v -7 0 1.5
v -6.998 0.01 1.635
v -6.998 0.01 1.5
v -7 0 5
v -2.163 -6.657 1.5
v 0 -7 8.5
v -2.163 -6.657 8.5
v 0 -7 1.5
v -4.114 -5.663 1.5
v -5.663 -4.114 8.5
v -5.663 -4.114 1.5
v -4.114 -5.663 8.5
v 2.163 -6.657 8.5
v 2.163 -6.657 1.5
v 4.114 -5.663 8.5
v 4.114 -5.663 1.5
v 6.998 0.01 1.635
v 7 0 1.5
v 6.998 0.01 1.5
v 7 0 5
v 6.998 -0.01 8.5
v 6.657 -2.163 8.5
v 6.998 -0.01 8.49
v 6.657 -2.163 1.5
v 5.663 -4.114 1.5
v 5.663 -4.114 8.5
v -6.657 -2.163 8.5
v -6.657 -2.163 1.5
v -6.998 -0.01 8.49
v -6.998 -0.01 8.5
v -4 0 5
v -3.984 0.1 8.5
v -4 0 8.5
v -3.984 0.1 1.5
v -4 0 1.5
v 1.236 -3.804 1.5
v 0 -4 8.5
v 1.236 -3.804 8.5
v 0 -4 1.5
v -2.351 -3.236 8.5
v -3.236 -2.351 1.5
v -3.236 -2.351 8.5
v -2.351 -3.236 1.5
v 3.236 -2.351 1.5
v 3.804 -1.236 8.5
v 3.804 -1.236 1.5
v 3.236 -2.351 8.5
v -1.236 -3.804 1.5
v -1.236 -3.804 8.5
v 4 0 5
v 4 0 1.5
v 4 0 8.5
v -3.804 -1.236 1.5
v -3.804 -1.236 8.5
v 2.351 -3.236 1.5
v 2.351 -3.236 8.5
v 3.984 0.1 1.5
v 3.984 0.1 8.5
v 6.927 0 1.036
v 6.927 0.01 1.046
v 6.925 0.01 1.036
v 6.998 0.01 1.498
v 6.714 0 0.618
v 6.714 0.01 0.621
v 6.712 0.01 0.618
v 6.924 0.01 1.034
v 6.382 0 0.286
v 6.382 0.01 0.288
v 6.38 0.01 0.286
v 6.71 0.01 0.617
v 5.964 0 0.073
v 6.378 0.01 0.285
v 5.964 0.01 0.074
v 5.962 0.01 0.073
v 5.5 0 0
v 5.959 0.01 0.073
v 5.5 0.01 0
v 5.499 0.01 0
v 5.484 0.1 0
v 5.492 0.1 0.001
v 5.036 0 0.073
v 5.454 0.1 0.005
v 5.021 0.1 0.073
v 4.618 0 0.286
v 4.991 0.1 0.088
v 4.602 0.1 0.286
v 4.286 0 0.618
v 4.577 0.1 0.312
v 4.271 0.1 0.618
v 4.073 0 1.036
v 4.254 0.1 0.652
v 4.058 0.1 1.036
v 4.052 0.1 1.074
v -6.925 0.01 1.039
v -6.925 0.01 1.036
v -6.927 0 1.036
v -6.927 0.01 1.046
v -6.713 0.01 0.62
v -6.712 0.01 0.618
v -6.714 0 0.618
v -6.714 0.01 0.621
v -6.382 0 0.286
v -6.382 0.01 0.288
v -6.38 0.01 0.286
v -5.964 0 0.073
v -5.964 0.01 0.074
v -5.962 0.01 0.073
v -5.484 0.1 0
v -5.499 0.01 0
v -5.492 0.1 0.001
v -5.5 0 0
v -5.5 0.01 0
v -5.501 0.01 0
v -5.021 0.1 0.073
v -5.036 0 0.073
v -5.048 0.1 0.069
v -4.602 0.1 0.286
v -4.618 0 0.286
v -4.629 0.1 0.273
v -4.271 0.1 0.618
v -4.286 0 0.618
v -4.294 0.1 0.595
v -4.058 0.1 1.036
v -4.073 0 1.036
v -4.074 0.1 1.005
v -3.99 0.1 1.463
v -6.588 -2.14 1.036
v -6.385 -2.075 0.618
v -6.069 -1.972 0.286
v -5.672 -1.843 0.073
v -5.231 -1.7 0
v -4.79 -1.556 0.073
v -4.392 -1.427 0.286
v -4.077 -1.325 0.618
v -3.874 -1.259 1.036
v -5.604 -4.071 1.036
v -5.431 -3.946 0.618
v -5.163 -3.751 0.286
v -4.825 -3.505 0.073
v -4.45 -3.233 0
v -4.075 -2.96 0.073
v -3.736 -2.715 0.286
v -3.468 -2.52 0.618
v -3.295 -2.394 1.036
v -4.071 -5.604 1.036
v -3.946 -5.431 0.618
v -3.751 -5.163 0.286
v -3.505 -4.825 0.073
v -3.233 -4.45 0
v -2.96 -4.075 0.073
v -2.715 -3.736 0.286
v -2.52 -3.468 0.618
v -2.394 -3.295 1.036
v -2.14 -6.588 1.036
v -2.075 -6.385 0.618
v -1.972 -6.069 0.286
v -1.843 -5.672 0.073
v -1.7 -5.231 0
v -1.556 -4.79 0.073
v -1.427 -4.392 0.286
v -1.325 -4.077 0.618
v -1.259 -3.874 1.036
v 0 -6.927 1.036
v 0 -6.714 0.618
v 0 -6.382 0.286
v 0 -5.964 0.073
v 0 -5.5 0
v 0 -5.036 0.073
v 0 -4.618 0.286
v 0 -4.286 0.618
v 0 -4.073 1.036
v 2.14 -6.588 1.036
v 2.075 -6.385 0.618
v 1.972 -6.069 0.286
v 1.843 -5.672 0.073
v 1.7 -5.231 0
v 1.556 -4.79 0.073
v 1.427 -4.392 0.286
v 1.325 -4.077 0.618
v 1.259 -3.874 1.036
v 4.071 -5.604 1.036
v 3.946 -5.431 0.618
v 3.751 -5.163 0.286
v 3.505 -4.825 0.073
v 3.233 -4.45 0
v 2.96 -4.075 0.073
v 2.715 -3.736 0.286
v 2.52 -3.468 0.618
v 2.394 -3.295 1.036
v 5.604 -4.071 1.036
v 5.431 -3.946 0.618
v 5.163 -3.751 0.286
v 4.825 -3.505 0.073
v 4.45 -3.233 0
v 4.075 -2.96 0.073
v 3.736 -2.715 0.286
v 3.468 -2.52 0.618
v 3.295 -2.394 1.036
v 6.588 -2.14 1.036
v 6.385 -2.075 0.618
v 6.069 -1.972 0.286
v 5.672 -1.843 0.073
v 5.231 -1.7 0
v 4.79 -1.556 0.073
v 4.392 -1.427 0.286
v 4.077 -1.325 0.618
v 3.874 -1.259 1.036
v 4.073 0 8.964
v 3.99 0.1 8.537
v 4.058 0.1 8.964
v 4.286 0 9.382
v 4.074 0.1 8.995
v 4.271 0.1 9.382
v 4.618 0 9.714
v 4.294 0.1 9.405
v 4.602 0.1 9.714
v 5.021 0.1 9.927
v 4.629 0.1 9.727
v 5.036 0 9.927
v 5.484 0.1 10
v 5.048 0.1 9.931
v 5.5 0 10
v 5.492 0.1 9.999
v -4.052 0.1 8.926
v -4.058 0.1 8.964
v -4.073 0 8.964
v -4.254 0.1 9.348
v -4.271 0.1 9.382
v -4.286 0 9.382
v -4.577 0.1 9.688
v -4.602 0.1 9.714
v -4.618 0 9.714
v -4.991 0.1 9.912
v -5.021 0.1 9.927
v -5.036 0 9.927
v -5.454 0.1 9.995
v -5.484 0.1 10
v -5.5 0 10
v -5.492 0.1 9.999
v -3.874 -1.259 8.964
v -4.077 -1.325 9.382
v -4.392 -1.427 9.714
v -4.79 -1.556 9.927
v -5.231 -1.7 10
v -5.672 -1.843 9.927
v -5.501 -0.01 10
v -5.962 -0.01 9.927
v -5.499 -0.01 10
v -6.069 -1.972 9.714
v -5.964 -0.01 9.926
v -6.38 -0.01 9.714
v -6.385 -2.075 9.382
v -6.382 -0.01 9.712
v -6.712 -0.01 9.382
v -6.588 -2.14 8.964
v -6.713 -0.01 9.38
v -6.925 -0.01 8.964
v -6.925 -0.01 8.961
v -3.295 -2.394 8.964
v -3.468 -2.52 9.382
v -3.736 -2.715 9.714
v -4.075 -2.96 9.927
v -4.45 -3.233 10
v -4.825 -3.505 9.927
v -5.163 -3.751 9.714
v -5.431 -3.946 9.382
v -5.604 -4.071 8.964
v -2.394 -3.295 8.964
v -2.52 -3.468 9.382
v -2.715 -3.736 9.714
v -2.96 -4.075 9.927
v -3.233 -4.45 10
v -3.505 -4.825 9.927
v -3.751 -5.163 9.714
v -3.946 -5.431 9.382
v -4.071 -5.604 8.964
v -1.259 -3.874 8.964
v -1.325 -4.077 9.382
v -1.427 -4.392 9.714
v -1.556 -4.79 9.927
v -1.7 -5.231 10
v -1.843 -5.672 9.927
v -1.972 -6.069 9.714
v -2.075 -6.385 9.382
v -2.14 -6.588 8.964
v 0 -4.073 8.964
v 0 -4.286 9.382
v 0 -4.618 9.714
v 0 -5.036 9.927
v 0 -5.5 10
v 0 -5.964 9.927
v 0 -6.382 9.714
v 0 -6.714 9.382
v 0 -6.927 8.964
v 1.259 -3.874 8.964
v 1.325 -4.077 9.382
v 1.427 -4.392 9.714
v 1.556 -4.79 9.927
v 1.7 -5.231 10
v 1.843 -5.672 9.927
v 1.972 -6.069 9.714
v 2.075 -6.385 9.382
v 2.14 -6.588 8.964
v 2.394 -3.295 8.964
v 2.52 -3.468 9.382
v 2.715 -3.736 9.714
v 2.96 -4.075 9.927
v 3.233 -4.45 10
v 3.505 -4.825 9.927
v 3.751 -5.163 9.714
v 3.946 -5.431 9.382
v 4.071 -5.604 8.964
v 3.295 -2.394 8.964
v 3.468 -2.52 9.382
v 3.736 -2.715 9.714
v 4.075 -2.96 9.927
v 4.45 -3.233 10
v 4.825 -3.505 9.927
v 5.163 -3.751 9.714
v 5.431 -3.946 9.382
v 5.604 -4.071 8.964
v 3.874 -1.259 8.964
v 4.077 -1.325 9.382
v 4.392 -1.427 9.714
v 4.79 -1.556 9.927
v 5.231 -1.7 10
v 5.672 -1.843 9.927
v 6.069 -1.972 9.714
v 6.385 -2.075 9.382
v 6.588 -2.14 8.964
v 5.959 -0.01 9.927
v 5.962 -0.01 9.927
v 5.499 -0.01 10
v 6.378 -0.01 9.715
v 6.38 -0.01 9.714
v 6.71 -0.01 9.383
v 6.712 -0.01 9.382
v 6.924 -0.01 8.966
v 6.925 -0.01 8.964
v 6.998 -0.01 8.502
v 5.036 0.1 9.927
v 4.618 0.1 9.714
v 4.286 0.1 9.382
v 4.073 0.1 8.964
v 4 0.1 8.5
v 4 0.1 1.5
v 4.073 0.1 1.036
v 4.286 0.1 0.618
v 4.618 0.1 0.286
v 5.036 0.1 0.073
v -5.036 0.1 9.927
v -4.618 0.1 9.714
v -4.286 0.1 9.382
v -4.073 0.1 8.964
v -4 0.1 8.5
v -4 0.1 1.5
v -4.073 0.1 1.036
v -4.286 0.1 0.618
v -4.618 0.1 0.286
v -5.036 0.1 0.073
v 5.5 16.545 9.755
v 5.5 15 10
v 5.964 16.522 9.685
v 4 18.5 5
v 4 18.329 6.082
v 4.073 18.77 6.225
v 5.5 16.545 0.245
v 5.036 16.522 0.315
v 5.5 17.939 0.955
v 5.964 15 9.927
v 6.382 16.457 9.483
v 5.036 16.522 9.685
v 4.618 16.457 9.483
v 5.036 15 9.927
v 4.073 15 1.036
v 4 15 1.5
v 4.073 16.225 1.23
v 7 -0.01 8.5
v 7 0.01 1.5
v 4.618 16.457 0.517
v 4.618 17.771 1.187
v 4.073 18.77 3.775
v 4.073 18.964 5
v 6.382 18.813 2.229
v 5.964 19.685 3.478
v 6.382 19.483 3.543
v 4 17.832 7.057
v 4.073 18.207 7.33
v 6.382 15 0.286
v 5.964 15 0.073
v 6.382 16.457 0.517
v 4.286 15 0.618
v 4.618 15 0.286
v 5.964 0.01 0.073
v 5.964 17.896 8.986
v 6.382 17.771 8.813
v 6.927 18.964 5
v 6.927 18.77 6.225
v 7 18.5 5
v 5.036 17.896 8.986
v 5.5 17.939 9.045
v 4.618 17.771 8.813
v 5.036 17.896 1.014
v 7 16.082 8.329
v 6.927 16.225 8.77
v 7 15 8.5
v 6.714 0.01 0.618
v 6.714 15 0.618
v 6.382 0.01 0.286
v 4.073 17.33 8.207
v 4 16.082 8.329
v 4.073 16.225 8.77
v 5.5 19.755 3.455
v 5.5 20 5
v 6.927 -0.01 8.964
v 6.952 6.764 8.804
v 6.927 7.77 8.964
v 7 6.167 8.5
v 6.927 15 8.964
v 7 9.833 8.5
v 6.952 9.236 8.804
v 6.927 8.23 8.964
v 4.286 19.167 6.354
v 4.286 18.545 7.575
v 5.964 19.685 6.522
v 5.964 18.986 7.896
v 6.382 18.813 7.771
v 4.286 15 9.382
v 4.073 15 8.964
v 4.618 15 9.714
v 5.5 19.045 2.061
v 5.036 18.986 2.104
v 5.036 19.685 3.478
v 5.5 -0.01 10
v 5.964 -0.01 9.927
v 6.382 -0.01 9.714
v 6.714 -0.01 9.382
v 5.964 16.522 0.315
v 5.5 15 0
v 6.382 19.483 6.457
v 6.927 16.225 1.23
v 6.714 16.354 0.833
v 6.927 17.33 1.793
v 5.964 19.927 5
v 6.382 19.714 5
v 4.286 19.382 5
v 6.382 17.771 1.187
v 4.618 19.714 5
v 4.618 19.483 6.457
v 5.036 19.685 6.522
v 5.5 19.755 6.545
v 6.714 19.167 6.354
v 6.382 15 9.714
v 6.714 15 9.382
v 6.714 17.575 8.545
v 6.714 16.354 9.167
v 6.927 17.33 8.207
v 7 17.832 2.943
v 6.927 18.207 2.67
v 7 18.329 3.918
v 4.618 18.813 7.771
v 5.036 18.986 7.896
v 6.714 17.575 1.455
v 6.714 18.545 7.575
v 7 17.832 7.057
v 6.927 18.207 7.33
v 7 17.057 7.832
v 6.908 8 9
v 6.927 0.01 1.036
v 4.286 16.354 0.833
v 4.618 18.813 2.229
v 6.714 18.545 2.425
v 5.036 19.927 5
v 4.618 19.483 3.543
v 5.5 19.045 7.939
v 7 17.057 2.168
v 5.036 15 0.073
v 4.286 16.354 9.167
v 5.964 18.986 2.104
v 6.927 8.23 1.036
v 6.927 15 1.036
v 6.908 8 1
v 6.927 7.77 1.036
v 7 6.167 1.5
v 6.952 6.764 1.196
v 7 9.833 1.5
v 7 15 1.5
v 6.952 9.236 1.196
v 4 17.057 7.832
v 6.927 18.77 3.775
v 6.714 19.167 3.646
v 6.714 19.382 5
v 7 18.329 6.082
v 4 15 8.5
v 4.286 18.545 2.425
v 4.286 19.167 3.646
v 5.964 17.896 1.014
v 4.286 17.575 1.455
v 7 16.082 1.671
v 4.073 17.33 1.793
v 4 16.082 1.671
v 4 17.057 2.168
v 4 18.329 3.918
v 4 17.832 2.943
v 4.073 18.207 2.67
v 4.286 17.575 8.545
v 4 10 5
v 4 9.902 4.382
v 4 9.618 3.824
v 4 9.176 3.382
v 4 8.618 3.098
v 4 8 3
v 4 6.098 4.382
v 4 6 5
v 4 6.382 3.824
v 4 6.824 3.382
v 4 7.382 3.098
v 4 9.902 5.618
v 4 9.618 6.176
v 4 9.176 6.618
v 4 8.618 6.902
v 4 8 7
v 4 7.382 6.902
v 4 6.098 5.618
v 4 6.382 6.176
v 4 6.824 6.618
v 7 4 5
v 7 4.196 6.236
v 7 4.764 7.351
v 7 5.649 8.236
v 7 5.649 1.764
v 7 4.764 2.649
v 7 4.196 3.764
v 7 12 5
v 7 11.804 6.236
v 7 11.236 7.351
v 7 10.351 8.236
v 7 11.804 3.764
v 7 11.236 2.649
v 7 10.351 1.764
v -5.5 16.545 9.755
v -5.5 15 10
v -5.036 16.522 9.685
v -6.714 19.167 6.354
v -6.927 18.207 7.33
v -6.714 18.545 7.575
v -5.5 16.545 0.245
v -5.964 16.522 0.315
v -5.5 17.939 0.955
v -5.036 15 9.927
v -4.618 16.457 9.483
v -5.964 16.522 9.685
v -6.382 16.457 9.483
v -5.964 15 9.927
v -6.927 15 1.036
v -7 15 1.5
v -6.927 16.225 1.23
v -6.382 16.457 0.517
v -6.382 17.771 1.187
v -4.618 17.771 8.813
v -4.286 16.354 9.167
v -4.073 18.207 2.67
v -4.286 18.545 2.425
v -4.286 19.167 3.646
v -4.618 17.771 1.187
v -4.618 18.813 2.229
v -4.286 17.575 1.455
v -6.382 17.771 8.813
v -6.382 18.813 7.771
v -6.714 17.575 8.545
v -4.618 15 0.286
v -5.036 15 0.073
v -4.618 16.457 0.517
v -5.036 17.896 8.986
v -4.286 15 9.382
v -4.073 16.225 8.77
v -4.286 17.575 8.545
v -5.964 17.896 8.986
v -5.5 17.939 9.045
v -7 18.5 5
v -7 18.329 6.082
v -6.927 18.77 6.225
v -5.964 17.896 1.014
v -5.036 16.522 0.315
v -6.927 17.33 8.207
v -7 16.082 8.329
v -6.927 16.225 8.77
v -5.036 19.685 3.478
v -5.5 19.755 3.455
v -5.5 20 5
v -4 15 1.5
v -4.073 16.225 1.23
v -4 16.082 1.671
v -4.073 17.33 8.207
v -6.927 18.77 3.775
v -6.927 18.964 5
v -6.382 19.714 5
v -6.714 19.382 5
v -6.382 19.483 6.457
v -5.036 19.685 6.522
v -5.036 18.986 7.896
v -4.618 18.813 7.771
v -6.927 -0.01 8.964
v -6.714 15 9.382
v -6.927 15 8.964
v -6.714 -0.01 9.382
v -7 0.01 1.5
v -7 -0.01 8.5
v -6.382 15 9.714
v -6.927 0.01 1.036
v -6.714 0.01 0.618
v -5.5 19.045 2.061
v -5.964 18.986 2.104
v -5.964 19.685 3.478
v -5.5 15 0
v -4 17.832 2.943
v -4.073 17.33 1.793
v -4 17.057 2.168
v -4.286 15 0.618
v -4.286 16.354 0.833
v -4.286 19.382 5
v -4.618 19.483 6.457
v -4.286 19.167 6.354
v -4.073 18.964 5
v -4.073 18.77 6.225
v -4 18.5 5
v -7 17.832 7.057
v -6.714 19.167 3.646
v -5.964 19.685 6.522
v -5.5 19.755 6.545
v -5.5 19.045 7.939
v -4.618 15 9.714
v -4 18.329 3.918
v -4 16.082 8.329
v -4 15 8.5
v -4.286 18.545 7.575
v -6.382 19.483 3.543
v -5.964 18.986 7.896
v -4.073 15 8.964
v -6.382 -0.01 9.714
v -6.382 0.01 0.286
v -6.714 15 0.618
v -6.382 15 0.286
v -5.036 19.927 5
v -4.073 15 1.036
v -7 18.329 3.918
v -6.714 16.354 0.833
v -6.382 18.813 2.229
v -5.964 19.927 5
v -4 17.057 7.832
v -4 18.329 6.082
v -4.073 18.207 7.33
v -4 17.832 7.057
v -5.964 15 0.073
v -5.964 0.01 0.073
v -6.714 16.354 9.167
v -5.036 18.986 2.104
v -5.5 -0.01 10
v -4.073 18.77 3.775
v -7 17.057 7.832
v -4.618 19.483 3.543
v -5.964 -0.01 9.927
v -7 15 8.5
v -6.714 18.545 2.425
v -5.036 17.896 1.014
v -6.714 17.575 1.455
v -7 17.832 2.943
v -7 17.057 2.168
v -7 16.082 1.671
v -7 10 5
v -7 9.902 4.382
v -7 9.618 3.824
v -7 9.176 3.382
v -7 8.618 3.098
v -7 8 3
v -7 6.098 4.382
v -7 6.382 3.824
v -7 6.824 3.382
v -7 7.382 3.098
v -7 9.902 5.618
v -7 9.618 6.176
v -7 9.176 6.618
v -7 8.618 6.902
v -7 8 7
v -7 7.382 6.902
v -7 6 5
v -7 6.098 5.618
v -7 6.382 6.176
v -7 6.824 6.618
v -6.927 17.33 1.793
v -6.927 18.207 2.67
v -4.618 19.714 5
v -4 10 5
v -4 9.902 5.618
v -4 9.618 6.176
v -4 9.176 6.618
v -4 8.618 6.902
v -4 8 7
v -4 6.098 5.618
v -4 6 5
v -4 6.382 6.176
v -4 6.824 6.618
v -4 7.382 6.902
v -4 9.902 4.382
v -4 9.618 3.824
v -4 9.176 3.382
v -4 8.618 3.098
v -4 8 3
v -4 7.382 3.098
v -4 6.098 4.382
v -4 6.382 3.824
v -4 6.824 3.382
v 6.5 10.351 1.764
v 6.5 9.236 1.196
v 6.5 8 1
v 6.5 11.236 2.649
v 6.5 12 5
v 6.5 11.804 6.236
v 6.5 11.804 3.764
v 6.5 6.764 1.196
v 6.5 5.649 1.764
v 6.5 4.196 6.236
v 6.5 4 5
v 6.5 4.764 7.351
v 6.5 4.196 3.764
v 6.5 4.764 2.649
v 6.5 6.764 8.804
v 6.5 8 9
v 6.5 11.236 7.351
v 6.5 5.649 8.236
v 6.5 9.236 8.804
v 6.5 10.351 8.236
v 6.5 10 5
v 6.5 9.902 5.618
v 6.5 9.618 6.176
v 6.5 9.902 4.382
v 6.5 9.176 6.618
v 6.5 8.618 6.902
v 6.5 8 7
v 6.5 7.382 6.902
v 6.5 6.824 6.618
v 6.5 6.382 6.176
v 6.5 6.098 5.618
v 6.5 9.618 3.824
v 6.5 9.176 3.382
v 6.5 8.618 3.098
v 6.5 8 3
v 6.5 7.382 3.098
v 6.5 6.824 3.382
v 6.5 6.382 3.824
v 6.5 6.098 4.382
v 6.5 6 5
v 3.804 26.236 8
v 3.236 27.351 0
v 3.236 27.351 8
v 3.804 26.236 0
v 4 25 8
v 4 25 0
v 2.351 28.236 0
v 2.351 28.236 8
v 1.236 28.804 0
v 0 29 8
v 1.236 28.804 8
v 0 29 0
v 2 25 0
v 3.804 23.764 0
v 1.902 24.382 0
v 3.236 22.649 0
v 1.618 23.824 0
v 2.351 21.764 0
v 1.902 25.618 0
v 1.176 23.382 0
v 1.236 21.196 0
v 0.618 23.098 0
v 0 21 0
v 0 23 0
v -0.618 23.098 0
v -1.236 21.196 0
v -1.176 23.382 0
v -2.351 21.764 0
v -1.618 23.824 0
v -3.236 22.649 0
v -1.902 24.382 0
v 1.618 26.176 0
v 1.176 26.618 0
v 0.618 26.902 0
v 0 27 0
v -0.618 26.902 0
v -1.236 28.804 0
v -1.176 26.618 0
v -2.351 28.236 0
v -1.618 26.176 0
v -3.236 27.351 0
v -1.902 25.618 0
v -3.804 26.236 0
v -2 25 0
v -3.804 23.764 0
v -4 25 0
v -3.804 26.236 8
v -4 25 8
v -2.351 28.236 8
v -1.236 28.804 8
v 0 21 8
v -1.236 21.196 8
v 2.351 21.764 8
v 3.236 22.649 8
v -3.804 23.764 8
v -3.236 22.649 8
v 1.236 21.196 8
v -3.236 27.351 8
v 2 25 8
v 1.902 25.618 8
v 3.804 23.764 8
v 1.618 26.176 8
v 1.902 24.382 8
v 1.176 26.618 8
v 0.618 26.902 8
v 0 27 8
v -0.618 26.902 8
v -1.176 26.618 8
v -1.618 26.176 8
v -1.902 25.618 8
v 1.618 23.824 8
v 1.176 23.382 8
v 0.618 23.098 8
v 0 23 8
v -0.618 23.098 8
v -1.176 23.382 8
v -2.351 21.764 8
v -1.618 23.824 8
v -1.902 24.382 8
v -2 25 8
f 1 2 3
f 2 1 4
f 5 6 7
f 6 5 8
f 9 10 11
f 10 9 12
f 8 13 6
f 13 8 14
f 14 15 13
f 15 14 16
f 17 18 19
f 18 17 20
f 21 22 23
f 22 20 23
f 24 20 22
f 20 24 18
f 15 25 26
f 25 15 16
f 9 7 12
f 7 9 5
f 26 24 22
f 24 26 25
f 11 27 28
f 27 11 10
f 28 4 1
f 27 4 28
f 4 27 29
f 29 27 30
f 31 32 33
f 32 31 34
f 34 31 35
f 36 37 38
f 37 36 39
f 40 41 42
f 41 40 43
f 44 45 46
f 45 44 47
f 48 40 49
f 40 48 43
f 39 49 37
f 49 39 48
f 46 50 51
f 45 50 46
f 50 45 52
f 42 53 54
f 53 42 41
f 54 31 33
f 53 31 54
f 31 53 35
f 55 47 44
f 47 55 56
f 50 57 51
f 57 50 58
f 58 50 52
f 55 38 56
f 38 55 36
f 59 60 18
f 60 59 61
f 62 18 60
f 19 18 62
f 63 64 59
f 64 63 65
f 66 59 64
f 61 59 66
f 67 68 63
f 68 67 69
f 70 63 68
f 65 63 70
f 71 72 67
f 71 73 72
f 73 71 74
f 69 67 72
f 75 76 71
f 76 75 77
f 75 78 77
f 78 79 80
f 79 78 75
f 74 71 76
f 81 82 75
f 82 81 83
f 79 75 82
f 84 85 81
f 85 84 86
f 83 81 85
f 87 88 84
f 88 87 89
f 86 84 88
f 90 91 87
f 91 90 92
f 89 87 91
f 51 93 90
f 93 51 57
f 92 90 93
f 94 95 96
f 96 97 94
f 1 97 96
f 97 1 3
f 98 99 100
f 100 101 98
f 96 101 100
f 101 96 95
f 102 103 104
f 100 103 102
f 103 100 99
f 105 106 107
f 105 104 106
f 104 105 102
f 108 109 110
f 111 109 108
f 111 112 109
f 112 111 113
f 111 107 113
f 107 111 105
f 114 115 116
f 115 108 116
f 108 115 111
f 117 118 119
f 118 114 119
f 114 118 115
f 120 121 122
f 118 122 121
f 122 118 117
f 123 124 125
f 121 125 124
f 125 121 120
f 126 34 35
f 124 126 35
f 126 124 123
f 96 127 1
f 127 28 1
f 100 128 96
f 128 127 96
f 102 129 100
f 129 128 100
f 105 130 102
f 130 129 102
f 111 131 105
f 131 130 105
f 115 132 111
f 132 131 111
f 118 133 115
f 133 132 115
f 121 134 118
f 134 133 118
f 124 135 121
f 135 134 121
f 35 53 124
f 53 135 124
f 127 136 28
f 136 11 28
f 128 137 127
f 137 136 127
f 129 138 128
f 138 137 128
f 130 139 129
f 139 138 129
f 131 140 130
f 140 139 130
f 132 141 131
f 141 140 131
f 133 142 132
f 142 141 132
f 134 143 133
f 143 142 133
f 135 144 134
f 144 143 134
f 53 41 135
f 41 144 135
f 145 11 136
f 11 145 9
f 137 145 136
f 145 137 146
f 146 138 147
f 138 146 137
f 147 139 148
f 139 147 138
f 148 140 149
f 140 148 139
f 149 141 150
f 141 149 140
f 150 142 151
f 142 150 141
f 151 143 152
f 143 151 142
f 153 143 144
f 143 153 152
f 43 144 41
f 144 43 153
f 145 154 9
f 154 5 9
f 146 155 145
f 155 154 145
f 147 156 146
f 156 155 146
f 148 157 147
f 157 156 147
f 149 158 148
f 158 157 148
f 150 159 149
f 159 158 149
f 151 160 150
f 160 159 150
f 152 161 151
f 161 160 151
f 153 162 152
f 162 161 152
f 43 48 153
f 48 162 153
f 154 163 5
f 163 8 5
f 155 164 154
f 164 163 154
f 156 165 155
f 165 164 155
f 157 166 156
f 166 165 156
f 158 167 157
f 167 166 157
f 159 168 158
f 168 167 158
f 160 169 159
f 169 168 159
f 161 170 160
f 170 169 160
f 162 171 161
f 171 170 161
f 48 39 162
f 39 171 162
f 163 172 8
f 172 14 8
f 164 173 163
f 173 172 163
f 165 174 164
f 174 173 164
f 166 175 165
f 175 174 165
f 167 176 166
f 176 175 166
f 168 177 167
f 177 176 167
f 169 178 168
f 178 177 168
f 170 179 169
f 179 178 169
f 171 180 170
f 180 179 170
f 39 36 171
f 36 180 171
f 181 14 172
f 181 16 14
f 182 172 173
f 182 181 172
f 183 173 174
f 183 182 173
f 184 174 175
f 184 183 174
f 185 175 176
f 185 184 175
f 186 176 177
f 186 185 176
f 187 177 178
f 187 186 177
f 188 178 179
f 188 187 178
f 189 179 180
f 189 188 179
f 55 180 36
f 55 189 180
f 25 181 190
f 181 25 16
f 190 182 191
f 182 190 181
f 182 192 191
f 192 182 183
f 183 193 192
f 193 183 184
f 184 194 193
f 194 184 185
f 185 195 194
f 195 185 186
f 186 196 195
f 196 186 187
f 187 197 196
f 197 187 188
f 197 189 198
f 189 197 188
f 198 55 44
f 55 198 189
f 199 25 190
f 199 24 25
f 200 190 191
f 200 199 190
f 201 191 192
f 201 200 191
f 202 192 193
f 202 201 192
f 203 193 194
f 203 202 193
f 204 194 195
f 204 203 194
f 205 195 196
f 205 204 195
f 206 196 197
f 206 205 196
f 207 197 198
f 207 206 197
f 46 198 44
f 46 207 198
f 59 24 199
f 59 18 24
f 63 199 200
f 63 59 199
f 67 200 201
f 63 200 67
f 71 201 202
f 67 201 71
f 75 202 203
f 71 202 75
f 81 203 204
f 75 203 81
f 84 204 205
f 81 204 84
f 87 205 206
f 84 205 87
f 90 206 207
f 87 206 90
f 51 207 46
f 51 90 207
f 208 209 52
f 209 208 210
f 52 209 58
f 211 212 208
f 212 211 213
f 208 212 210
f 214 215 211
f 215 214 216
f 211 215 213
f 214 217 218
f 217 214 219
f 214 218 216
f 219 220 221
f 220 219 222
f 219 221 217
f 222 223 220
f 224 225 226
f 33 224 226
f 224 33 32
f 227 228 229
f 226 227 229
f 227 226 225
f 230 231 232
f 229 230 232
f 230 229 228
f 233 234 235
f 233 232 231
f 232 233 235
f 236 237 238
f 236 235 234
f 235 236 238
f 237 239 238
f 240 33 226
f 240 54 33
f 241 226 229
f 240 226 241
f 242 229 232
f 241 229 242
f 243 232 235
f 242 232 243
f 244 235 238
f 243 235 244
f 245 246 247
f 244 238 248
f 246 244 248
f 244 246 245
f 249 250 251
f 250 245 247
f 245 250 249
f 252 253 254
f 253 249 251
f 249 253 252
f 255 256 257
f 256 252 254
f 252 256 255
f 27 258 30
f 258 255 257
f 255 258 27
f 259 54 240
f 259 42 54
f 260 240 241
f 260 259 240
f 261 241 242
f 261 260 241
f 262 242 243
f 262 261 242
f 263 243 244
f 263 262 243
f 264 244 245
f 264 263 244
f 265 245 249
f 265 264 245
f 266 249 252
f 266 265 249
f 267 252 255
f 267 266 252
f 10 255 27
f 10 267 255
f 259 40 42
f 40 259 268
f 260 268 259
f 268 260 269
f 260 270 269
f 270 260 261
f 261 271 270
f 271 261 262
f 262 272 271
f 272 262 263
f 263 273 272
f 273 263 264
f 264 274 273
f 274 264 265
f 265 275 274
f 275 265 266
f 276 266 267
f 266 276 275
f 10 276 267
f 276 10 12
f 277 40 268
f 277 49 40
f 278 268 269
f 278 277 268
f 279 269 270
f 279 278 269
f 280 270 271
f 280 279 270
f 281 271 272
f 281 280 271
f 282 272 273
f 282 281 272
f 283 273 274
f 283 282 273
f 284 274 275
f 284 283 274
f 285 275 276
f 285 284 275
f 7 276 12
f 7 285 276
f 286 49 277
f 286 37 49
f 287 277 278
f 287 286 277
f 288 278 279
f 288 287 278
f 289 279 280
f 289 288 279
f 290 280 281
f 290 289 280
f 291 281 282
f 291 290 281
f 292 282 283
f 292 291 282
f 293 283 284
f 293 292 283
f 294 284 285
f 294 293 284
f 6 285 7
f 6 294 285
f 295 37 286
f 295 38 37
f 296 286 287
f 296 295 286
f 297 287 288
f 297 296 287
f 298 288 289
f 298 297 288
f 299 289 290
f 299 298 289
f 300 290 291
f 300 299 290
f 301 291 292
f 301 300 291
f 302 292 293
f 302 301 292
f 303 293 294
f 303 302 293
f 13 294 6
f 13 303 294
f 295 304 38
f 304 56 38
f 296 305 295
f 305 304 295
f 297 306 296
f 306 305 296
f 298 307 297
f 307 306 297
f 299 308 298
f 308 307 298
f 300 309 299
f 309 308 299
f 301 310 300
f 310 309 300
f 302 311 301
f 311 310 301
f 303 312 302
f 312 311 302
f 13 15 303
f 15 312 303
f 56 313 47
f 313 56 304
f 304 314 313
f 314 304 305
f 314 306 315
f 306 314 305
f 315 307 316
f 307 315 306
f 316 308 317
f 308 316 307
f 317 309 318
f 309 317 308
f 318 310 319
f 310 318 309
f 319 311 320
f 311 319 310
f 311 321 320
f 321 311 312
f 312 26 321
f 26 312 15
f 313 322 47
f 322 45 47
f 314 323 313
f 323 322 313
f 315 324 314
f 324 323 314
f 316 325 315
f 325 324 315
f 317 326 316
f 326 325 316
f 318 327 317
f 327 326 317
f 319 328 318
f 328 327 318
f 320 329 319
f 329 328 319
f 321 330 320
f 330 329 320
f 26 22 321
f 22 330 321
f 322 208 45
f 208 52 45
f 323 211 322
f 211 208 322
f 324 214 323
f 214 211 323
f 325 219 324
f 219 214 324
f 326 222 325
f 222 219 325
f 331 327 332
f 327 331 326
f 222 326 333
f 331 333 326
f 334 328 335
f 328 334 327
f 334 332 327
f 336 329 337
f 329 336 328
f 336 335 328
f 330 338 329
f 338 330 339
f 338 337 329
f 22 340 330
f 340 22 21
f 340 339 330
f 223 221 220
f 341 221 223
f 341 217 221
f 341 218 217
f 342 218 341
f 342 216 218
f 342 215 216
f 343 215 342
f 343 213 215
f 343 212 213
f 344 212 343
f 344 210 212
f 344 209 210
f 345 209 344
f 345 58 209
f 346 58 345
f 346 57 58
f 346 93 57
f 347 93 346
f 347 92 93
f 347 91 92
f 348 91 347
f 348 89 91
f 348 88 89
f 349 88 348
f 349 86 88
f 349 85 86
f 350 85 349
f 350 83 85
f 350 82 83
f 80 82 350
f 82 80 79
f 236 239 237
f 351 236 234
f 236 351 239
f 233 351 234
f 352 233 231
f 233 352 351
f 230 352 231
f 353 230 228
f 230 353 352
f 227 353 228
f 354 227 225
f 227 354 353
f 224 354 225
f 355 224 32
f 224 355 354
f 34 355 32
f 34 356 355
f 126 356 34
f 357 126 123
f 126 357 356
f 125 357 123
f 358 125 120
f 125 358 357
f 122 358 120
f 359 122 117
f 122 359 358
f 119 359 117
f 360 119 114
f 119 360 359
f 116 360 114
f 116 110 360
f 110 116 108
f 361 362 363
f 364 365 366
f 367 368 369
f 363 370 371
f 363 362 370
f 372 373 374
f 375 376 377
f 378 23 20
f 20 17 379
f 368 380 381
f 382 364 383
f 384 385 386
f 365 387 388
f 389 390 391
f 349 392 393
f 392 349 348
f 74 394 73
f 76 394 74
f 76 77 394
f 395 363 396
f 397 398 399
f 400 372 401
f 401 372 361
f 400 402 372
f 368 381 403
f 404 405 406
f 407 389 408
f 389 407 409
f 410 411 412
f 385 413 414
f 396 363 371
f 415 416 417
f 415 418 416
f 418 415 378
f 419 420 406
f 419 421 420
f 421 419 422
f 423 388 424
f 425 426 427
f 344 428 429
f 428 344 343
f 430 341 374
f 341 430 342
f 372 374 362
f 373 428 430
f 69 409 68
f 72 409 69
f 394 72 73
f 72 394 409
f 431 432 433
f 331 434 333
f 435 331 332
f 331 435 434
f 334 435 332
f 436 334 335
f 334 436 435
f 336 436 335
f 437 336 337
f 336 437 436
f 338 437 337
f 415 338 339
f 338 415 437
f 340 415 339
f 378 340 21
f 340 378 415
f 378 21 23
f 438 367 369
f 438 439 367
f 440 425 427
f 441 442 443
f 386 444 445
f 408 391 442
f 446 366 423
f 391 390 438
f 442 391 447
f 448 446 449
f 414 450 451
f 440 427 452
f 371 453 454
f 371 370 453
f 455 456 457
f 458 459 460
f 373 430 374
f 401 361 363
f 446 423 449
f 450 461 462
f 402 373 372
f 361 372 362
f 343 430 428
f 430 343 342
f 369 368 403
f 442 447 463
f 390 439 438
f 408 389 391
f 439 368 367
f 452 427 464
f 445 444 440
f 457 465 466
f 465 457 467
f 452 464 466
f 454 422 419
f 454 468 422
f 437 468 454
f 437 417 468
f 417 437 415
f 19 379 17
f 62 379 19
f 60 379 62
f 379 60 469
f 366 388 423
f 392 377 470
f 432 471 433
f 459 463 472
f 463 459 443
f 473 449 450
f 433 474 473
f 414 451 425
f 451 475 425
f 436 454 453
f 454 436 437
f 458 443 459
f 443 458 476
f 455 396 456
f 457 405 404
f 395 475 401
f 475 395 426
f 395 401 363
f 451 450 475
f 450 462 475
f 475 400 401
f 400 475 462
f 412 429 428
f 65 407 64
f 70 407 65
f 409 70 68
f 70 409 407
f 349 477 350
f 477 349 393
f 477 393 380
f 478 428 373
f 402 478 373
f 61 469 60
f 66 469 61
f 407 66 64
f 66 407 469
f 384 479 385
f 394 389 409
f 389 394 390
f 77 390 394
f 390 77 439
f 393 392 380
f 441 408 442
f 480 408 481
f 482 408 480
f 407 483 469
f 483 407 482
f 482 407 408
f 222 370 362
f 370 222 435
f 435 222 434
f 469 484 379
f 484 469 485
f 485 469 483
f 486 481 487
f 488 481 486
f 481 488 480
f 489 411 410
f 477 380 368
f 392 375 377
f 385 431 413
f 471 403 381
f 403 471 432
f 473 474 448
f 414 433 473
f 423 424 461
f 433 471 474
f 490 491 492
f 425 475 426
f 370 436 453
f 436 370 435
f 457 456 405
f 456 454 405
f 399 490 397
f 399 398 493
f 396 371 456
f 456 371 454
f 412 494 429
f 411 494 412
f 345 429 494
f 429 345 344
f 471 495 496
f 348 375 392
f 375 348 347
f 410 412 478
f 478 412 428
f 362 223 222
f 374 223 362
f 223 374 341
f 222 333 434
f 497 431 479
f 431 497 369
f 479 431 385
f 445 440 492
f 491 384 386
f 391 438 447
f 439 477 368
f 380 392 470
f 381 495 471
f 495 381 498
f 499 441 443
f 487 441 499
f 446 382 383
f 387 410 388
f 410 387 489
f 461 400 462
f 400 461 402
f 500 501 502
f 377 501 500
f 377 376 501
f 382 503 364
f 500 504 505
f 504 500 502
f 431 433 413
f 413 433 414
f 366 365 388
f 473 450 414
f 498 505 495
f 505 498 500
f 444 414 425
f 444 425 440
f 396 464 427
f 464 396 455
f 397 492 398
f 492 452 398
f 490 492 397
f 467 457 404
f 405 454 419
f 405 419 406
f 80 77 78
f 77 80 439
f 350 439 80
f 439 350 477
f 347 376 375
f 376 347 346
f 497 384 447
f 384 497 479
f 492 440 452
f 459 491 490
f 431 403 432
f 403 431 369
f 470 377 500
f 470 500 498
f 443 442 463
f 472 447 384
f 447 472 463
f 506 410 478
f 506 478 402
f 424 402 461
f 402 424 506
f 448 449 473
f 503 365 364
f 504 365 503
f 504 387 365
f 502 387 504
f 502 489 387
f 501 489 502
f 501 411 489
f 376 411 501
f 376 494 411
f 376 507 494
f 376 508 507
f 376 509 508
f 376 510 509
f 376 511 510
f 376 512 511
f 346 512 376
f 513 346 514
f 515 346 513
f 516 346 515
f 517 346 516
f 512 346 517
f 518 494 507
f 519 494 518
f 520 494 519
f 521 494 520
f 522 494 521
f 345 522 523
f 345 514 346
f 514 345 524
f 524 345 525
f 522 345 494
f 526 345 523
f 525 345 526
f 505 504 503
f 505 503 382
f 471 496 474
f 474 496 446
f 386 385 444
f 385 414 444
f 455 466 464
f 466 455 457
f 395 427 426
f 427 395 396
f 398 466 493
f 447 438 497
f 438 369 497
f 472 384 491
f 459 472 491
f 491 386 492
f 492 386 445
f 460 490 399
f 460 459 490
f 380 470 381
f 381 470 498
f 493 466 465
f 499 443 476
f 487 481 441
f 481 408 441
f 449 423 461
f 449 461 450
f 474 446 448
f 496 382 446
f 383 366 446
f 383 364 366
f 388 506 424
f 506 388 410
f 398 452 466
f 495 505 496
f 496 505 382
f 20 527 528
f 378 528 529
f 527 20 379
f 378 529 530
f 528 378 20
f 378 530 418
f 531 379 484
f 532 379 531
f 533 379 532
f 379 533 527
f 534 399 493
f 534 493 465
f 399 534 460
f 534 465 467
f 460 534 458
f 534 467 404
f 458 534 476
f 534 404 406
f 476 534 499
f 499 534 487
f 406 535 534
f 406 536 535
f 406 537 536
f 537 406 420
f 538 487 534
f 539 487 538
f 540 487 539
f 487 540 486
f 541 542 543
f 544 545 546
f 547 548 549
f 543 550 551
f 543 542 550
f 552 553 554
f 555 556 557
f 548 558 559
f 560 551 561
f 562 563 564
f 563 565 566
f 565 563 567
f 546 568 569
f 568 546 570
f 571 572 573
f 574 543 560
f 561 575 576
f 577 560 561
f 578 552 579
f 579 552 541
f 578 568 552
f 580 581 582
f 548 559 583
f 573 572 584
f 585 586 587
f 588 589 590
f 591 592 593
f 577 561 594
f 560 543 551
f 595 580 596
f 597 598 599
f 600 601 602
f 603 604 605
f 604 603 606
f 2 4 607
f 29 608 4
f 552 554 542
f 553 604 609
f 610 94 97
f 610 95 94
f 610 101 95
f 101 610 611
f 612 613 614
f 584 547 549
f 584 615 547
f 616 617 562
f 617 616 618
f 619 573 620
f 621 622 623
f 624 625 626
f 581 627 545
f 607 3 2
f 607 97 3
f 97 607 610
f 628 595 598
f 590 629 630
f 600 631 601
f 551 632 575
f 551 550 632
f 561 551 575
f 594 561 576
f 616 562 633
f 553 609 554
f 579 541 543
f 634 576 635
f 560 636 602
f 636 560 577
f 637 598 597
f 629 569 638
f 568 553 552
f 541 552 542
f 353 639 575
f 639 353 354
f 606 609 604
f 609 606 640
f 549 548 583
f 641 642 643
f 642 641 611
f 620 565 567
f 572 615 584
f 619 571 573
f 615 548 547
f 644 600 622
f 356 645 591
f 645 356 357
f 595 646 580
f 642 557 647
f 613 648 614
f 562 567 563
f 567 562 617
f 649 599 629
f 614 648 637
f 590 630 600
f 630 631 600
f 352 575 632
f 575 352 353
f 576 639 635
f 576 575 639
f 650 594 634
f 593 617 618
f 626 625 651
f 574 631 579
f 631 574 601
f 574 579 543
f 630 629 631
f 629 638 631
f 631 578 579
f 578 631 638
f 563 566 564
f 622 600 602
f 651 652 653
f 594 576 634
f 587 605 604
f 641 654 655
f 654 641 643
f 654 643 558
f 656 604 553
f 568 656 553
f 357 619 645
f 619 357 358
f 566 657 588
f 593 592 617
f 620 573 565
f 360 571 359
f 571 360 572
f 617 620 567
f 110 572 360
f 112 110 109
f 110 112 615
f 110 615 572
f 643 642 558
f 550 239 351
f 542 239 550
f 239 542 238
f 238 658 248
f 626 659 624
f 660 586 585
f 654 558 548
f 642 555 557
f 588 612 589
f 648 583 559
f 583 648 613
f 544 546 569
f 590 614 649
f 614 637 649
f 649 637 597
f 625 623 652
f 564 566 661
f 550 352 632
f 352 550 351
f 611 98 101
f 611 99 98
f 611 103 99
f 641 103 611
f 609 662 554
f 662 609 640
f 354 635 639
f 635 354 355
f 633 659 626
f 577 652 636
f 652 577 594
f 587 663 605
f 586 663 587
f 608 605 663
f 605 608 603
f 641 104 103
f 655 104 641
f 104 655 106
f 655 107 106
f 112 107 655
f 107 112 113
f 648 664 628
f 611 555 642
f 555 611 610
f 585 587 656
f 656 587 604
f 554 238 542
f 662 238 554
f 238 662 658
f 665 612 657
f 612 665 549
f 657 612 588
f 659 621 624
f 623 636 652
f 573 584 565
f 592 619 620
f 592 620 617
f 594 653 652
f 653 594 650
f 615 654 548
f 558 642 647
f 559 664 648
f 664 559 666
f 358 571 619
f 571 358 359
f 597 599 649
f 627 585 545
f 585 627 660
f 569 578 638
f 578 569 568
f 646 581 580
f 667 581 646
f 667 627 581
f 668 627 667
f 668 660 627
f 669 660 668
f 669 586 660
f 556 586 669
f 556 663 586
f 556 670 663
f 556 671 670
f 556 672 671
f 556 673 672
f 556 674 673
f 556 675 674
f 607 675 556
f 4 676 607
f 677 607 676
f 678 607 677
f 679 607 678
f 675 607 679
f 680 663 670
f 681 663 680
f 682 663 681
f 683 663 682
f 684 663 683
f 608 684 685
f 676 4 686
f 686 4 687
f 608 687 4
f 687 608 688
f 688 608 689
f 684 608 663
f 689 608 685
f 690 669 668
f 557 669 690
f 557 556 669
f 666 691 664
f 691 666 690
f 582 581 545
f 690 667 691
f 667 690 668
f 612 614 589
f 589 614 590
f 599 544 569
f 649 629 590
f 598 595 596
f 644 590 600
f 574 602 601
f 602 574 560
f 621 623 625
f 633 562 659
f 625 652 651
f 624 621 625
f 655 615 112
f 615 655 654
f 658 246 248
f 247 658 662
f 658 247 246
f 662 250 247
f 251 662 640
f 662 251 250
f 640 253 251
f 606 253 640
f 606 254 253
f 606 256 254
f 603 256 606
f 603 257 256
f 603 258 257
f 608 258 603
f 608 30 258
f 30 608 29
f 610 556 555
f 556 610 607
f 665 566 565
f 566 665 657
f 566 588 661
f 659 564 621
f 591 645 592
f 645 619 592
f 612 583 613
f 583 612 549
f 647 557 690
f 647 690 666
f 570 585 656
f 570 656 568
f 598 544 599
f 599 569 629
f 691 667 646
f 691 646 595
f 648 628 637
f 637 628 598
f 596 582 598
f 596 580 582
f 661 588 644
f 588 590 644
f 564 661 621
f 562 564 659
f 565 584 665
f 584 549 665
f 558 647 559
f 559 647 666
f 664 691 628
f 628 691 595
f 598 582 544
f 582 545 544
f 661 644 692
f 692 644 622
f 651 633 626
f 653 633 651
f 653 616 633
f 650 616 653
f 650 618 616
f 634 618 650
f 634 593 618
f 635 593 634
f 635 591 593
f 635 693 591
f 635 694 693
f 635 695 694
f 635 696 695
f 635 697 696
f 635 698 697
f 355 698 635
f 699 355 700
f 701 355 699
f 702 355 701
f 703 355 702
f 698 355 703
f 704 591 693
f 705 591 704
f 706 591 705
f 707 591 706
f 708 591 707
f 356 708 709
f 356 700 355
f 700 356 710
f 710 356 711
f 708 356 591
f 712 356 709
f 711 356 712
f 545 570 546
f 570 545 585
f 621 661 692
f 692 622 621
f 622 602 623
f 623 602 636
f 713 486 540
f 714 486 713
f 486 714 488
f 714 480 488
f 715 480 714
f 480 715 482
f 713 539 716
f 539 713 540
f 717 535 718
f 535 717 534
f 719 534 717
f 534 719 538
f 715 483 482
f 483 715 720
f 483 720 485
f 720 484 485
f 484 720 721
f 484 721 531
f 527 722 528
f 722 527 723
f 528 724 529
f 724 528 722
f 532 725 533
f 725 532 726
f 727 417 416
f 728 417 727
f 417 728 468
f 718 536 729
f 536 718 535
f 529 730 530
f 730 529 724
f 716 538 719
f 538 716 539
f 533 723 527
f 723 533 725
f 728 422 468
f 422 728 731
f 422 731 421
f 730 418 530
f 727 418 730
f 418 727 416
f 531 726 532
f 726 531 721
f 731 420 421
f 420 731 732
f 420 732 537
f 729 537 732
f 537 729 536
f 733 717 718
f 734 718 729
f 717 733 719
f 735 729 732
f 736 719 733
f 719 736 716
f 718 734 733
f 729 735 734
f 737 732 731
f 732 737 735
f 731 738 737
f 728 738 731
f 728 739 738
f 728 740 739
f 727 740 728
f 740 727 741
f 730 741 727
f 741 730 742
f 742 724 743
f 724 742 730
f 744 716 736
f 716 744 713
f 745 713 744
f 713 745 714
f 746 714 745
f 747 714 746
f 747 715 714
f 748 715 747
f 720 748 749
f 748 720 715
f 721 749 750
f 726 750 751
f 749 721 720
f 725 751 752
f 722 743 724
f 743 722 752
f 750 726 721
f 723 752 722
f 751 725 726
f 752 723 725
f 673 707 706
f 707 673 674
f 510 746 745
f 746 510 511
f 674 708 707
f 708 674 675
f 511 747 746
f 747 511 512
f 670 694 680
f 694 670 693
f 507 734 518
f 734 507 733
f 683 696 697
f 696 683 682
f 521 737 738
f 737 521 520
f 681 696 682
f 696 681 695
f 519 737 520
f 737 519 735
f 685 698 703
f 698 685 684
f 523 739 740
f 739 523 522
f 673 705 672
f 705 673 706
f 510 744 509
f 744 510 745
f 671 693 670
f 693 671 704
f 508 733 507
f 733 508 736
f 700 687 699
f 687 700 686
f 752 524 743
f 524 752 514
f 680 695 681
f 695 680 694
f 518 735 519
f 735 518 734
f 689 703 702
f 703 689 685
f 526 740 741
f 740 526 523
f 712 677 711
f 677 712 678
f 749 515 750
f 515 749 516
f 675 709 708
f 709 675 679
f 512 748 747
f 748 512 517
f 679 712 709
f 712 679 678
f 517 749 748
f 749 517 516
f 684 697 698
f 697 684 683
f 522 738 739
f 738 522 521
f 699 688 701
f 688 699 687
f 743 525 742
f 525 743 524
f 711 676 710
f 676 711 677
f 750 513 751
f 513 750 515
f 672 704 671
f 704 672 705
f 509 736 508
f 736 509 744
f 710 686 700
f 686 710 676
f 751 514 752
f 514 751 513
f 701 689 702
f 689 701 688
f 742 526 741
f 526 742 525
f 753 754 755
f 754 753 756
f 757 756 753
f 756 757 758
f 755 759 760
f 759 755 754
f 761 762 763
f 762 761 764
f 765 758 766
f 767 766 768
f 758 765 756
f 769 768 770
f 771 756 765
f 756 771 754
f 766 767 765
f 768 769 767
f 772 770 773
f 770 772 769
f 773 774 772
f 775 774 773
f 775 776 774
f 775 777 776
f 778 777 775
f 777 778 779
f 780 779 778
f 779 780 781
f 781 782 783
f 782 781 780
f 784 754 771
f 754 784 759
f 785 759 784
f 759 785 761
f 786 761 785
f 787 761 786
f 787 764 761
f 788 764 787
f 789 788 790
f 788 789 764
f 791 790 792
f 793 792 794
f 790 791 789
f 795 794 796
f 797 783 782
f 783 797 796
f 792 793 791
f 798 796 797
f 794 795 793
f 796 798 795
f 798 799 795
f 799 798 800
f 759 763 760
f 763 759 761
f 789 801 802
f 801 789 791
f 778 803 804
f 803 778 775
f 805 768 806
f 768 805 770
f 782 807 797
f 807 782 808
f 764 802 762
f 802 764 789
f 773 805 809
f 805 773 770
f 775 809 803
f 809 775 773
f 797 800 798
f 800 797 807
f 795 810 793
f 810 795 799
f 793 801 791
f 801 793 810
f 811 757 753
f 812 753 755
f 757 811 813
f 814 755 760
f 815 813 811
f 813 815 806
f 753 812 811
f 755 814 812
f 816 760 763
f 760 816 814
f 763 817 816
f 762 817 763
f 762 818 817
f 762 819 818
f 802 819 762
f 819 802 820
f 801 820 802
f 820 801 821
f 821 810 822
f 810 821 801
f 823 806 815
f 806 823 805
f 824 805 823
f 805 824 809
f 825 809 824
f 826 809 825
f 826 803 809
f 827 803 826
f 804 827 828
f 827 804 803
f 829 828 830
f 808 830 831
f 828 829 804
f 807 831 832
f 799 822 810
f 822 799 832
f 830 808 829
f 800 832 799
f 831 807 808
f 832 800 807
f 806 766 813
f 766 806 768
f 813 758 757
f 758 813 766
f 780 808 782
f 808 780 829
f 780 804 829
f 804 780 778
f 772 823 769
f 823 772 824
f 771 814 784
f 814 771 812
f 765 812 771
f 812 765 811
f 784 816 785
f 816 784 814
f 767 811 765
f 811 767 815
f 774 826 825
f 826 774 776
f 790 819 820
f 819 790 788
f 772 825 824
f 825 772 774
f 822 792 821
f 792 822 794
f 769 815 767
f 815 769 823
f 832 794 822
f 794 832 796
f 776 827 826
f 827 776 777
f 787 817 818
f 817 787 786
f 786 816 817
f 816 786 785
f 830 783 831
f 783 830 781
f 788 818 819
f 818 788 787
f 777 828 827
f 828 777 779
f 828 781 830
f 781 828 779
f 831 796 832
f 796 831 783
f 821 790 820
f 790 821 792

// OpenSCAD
$fn=20;

module clip() {
    difference(){
        union(){
            difference(){
                hull(){
                    rotate([0,90,0]) cylinder(r=5, h=10, center = true);
                    translate([0,15,0]) cylinder(r=5, h=10, center = true);
                }
                rotate([0,90,0]) hull(){
                     cylinder(r=3, h=12, center = true);
                    translate([0,20,0]) cube([6,6,12], center = true);
                }
            }
            translate([0,8,0]) cylinder(r=5, h=10,center=true);
        }

        //trou de vis
        translate([0,8,4.5]) cylinder(r=4, h=10);
        translate([0,8,0]) cylinder(r=1.5, h=12,center=true);
    }
}
module torus(torus_radius,body_radius){
rotate_extrude(angle = 360, convexity = 2) translate([torus_radius,0,0]) circle(r=body_radius);
}
module ring(height,hole_radius,thickness){
    half_thickness = (thickness/2);
    difference(){
        cylinder(
            r=(hole_radius+thickness),
            h=height-thickness,center = true);
        cylinder(r=hole_radius,h=height,center = true);
    }
    translate([0,0,(height/2)-half_thickness]) torus(hole_radius+half_thickness,half_thickness);
    translate([0,0,-((height/2)-half_thickness)]) torus(hole_radius+half_thickness,half_thickness);
}
module flap(width,thickness){
    half_thickness = (thickness/2);
    half_width = width/2;
     hull(){
        translate([0,15,0])torus(half_width-half_thickness,half_thickness);
        translate([half_width-half_thickness,0.01,0]) rotate([-90,0,0]) cylinder(r=half_thickness,h=1);
        translate([-(half_width-half_thickness),-0.01,0]) rotate([-90,0,0]) cylinder(r=half_thickness,h=1);
    }
}
    width = 10;
    thickness = 3;
    height = 14;
    length = 20;

    half_thickness = (thickness/2);
translate([0,0,width/2]) rotate([0,90,0]) difference(){


    union(){
        translate([0,0,height/2-half_thickness]) flap(width,thickness);
        translate([0,0,-(height/2-half_thickness)]) flap(width,thickness);
        difference(){
            rotate([0,90,0]) ring(width,height/2-thickness,thickness);
            translate([0,(length/2)+0.1,0]) cube([width+2,length,height+2],center=true);
        }
    }
    //trou de vis
    translate([0,8,height/2-0.5]) cylinder(r=(width-2)/2, h=10);
    translate([0,8,0]) cylinder(r=2, h=height+2,center=true);
}
translate([0,length+width/2,0]) difference(){
    cylinder(r=(width-2)/2, h=height-(thickness*2));
    translate([0,0,-1]) cylinder(r=2, h=height);

}
